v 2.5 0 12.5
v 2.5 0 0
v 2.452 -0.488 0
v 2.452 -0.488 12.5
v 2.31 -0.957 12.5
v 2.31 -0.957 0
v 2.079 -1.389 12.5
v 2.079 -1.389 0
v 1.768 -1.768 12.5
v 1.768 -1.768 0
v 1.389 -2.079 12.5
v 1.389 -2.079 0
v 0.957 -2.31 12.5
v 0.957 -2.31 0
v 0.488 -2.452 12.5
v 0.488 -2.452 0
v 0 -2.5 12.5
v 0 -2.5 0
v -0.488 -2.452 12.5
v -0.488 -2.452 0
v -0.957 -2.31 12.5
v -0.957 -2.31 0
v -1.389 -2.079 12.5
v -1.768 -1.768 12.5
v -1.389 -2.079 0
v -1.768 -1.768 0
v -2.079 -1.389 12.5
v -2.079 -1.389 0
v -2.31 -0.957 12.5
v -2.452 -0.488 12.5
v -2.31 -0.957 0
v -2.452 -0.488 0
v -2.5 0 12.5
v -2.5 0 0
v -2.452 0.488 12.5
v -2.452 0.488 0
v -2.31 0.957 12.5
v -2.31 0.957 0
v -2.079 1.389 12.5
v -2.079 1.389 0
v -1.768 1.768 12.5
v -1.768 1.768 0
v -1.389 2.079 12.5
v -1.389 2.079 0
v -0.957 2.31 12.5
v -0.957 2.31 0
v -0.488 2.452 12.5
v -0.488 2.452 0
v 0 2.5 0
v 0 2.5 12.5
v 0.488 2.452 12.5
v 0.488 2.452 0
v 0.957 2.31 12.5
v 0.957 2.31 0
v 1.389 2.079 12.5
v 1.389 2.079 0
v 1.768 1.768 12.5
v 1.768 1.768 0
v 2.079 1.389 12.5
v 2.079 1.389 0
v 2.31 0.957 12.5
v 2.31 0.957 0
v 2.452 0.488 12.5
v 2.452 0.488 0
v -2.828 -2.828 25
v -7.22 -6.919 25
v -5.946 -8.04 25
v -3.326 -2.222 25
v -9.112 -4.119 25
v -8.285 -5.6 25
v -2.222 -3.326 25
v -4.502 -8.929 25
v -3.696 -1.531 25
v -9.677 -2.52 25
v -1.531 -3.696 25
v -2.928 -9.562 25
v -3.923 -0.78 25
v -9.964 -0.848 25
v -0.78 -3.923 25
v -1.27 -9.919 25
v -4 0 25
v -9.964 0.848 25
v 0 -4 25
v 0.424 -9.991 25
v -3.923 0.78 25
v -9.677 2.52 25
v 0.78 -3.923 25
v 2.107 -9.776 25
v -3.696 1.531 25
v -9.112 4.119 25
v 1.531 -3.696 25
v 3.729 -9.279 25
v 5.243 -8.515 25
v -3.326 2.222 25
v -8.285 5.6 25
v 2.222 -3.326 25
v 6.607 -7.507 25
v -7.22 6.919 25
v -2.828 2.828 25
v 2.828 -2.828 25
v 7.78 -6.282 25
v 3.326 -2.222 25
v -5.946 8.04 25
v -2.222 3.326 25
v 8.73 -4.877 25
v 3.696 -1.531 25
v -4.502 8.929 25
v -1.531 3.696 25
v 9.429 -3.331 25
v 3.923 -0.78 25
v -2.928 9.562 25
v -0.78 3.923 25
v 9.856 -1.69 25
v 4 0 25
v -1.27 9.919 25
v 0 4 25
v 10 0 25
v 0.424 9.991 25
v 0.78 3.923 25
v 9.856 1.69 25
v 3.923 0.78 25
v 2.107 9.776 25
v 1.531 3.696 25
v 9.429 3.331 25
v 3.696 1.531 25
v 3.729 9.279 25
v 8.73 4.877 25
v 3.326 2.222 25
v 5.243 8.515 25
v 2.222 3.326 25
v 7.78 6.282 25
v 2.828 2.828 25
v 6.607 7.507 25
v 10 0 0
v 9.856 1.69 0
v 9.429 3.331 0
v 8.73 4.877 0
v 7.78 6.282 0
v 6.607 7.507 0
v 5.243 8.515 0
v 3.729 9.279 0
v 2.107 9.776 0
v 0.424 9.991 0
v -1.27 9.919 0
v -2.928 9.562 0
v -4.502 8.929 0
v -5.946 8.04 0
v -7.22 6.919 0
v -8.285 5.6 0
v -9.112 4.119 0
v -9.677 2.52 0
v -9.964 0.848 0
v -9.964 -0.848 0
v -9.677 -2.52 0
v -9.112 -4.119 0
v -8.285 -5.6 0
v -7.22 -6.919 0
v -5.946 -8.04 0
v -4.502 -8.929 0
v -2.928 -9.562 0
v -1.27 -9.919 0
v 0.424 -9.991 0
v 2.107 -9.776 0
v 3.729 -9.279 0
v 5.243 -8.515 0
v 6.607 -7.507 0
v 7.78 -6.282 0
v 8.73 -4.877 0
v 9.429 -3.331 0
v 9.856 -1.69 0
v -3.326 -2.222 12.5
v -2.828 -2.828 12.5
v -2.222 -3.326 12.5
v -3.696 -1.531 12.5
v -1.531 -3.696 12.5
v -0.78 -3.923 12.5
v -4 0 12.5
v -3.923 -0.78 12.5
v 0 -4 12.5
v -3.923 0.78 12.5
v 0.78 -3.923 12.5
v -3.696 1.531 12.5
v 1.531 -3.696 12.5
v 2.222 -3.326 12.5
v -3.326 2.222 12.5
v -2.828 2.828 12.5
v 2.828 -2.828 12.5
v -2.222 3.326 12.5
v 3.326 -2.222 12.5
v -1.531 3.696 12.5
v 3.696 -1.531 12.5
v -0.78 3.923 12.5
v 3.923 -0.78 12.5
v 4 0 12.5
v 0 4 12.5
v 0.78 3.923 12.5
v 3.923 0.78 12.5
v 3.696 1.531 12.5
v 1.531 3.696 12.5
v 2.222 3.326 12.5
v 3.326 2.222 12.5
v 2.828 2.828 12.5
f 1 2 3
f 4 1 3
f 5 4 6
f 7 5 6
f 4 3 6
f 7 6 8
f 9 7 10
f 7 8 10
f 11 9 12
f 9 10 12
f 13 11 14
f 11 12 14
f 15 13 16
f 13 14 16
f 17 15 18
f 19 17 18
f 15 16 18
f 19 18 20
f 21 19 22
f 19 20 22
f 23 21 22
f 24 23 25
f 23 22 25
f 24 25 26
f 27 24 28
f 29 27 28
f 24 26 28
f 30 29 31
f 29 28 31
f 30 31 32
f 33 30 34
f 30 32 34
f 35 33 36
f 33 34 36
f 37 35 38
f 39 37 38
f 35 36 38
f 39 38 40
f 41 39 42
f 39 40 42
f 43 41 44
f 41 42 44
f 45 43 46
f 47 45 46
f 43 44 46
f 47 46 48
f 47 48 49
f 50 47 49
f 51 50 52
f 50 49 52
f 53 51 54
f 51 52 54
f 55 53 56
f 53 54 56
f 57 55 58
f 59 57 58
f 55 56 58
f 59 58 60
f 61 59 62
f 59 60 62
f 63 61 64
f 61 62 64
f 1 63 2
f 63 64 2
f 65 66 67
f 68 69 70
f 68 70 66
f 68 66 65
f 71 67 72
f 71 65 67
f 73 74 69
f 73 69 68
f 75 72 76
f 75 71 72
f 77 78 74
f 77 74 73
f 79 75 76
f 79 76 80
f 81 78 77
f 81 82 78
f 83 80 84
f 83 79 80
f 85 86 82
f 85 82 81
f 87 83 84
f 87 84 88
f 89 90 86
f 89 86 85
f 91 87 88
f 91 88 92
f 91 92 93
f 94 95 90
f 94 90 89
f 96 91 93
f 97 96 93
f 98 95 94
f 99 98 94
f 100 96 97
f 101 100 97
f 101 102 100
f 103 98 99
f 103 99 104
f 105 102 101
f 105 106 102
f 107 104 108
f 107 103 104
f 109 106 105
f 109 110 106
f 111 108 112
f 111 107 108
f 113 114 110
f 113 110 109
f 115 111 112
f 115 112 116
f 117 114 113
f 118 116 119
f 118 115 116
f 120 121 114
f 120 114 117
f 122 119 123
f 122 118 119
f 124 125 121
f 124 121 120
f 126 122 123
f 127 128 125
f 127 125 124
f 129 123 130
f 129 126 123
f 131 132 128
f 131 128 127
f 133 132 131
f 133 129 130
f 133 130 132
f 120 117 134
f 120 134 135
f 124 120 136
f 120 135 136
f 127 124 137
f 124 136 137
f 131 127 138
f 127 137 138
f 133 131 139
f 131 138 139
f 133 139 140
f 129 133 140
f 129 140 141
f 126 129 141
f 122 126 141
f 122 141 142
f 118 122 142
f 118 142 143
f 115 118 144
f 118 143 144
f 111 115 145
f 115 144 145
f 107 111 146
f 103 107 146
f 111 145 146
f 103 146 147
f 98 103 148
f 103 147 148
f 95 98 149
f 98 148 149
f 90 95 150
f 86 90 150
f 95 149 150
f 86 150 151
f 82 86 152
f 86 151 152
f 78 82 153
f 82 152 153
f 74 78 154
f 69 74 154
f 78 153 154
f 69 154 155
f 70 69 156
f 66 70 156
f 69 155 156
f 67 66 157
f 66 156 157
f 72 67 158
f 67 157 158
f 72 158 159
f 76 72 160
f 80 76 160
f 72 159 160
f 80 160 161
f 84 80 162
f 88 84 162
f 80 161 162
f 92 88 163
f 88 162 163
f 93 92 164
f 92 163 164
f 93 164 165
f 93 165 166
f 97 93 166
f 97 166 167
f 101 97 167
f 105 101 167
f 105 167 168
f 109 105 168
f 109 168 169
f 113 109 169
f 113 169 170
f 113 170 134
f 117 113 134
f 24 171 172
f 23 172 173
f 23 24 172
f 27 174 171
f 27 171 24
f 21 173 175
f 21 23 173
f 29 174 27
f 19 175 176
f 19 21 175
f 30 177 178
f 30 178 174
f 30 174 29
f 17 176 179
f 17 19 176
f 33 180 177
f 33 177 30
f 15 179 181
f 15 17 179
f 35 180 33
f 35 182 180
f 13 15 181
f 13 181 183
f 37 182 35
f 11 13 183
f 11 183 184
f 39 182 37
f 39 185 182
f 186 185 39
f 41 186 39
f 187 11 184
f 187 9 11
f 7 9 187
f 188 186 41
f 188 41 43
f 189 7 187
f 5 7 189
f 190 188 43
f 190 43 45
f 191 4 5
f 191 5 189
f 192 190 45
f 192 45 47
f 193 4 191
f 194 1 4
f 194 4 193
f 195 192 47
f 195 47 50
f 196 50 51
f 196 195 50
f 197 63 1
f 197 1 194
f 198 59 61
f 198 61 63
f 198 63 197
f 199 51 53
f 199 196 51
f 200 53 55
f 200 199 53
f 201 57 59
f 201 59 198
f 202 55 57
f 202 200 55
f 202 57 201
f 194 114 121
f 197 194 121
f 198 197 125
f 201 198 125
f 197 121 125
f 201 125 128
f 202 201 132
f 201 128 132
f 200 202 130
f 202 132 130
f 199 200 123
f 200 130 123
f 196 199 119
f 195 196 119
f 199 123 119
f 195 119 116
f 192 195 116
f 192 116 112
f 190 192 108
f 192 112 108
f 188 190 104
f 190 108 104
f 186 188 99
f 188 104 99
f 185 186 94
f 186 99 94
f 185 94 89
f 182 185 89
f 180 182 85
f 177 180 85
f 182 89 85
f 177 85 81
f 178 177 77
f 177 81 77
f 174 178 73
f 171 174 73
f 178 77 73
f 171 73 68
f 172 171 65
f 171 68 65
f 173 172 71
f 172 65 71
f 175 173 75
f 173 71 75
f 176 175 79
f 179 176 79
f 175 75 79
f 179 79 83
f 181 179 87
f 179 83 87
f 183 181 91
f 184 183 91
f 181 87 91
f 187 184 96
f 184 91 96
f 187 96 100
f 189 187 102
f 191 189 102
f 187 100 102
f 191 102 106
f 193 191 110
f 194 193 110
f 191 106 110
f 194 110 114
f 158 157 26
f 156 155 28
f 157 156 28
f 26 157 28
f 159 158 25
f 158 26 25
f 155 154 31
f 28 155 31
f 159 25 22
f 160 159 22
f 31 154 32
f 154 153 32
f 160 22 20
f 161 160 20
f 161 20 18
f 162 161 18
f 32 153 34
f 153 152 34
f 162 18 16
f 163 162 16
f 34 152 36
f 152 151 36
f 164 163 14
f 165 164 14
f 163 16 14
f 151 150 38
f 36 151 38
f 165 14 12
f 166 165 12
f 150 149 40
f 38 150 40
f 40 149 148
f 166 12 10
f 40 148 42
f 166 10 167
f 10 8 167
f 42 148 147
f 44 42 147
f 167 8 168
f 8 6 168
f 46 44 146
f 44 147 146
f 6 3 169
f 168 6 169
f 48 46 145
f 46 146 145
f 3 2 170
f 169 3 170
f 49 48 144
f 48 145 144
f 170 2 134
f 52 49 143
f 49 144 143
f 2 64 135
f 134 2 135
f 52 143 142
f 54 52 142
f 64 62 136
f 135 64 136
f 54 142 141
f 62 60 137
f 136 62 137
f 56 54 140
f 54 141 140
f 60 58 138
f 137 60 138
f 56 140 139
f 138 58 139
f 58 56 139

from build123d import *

# Parameters (mm, degrees)
SKETCH_R        = 10
PAD_DEPTH       = 25
SKETCH001_R     = 4
POCKET_DEPTH    = 12.5
SKETCH002_R     = 2.5
POCKET001_DEPTH = 12.5


with BuildPart() as part:
    # Sketch → Pad (new body)
    with BuildSketch(Plane.XY):
        Circle(SKETCH_R)
    extrude(amount=PAD_DEPTH)

    # Sketch001 (on Face3 of Pad) → Pocket (cut)
    with BuildSketch(Plane.XY.offset(25)):
        Circle(SKETCH001_R)
    extrude(amount=-POCKET_DEPTH, mode=Mode.SUBTRACT)

    # Sketch002 (on Face2 of Pocket) → Pocket001 (cut)
    with BuildSketch(Plane(origin=(0, 0, 0), x_dir=(1, 0, 0), z_dir=(0, 0, -1))):
        Circle(SKETCH002_R)
    extrude(amount=-POCKET001_DEPTH, mode=Mode.SUBTRACT)


solid = part.part
